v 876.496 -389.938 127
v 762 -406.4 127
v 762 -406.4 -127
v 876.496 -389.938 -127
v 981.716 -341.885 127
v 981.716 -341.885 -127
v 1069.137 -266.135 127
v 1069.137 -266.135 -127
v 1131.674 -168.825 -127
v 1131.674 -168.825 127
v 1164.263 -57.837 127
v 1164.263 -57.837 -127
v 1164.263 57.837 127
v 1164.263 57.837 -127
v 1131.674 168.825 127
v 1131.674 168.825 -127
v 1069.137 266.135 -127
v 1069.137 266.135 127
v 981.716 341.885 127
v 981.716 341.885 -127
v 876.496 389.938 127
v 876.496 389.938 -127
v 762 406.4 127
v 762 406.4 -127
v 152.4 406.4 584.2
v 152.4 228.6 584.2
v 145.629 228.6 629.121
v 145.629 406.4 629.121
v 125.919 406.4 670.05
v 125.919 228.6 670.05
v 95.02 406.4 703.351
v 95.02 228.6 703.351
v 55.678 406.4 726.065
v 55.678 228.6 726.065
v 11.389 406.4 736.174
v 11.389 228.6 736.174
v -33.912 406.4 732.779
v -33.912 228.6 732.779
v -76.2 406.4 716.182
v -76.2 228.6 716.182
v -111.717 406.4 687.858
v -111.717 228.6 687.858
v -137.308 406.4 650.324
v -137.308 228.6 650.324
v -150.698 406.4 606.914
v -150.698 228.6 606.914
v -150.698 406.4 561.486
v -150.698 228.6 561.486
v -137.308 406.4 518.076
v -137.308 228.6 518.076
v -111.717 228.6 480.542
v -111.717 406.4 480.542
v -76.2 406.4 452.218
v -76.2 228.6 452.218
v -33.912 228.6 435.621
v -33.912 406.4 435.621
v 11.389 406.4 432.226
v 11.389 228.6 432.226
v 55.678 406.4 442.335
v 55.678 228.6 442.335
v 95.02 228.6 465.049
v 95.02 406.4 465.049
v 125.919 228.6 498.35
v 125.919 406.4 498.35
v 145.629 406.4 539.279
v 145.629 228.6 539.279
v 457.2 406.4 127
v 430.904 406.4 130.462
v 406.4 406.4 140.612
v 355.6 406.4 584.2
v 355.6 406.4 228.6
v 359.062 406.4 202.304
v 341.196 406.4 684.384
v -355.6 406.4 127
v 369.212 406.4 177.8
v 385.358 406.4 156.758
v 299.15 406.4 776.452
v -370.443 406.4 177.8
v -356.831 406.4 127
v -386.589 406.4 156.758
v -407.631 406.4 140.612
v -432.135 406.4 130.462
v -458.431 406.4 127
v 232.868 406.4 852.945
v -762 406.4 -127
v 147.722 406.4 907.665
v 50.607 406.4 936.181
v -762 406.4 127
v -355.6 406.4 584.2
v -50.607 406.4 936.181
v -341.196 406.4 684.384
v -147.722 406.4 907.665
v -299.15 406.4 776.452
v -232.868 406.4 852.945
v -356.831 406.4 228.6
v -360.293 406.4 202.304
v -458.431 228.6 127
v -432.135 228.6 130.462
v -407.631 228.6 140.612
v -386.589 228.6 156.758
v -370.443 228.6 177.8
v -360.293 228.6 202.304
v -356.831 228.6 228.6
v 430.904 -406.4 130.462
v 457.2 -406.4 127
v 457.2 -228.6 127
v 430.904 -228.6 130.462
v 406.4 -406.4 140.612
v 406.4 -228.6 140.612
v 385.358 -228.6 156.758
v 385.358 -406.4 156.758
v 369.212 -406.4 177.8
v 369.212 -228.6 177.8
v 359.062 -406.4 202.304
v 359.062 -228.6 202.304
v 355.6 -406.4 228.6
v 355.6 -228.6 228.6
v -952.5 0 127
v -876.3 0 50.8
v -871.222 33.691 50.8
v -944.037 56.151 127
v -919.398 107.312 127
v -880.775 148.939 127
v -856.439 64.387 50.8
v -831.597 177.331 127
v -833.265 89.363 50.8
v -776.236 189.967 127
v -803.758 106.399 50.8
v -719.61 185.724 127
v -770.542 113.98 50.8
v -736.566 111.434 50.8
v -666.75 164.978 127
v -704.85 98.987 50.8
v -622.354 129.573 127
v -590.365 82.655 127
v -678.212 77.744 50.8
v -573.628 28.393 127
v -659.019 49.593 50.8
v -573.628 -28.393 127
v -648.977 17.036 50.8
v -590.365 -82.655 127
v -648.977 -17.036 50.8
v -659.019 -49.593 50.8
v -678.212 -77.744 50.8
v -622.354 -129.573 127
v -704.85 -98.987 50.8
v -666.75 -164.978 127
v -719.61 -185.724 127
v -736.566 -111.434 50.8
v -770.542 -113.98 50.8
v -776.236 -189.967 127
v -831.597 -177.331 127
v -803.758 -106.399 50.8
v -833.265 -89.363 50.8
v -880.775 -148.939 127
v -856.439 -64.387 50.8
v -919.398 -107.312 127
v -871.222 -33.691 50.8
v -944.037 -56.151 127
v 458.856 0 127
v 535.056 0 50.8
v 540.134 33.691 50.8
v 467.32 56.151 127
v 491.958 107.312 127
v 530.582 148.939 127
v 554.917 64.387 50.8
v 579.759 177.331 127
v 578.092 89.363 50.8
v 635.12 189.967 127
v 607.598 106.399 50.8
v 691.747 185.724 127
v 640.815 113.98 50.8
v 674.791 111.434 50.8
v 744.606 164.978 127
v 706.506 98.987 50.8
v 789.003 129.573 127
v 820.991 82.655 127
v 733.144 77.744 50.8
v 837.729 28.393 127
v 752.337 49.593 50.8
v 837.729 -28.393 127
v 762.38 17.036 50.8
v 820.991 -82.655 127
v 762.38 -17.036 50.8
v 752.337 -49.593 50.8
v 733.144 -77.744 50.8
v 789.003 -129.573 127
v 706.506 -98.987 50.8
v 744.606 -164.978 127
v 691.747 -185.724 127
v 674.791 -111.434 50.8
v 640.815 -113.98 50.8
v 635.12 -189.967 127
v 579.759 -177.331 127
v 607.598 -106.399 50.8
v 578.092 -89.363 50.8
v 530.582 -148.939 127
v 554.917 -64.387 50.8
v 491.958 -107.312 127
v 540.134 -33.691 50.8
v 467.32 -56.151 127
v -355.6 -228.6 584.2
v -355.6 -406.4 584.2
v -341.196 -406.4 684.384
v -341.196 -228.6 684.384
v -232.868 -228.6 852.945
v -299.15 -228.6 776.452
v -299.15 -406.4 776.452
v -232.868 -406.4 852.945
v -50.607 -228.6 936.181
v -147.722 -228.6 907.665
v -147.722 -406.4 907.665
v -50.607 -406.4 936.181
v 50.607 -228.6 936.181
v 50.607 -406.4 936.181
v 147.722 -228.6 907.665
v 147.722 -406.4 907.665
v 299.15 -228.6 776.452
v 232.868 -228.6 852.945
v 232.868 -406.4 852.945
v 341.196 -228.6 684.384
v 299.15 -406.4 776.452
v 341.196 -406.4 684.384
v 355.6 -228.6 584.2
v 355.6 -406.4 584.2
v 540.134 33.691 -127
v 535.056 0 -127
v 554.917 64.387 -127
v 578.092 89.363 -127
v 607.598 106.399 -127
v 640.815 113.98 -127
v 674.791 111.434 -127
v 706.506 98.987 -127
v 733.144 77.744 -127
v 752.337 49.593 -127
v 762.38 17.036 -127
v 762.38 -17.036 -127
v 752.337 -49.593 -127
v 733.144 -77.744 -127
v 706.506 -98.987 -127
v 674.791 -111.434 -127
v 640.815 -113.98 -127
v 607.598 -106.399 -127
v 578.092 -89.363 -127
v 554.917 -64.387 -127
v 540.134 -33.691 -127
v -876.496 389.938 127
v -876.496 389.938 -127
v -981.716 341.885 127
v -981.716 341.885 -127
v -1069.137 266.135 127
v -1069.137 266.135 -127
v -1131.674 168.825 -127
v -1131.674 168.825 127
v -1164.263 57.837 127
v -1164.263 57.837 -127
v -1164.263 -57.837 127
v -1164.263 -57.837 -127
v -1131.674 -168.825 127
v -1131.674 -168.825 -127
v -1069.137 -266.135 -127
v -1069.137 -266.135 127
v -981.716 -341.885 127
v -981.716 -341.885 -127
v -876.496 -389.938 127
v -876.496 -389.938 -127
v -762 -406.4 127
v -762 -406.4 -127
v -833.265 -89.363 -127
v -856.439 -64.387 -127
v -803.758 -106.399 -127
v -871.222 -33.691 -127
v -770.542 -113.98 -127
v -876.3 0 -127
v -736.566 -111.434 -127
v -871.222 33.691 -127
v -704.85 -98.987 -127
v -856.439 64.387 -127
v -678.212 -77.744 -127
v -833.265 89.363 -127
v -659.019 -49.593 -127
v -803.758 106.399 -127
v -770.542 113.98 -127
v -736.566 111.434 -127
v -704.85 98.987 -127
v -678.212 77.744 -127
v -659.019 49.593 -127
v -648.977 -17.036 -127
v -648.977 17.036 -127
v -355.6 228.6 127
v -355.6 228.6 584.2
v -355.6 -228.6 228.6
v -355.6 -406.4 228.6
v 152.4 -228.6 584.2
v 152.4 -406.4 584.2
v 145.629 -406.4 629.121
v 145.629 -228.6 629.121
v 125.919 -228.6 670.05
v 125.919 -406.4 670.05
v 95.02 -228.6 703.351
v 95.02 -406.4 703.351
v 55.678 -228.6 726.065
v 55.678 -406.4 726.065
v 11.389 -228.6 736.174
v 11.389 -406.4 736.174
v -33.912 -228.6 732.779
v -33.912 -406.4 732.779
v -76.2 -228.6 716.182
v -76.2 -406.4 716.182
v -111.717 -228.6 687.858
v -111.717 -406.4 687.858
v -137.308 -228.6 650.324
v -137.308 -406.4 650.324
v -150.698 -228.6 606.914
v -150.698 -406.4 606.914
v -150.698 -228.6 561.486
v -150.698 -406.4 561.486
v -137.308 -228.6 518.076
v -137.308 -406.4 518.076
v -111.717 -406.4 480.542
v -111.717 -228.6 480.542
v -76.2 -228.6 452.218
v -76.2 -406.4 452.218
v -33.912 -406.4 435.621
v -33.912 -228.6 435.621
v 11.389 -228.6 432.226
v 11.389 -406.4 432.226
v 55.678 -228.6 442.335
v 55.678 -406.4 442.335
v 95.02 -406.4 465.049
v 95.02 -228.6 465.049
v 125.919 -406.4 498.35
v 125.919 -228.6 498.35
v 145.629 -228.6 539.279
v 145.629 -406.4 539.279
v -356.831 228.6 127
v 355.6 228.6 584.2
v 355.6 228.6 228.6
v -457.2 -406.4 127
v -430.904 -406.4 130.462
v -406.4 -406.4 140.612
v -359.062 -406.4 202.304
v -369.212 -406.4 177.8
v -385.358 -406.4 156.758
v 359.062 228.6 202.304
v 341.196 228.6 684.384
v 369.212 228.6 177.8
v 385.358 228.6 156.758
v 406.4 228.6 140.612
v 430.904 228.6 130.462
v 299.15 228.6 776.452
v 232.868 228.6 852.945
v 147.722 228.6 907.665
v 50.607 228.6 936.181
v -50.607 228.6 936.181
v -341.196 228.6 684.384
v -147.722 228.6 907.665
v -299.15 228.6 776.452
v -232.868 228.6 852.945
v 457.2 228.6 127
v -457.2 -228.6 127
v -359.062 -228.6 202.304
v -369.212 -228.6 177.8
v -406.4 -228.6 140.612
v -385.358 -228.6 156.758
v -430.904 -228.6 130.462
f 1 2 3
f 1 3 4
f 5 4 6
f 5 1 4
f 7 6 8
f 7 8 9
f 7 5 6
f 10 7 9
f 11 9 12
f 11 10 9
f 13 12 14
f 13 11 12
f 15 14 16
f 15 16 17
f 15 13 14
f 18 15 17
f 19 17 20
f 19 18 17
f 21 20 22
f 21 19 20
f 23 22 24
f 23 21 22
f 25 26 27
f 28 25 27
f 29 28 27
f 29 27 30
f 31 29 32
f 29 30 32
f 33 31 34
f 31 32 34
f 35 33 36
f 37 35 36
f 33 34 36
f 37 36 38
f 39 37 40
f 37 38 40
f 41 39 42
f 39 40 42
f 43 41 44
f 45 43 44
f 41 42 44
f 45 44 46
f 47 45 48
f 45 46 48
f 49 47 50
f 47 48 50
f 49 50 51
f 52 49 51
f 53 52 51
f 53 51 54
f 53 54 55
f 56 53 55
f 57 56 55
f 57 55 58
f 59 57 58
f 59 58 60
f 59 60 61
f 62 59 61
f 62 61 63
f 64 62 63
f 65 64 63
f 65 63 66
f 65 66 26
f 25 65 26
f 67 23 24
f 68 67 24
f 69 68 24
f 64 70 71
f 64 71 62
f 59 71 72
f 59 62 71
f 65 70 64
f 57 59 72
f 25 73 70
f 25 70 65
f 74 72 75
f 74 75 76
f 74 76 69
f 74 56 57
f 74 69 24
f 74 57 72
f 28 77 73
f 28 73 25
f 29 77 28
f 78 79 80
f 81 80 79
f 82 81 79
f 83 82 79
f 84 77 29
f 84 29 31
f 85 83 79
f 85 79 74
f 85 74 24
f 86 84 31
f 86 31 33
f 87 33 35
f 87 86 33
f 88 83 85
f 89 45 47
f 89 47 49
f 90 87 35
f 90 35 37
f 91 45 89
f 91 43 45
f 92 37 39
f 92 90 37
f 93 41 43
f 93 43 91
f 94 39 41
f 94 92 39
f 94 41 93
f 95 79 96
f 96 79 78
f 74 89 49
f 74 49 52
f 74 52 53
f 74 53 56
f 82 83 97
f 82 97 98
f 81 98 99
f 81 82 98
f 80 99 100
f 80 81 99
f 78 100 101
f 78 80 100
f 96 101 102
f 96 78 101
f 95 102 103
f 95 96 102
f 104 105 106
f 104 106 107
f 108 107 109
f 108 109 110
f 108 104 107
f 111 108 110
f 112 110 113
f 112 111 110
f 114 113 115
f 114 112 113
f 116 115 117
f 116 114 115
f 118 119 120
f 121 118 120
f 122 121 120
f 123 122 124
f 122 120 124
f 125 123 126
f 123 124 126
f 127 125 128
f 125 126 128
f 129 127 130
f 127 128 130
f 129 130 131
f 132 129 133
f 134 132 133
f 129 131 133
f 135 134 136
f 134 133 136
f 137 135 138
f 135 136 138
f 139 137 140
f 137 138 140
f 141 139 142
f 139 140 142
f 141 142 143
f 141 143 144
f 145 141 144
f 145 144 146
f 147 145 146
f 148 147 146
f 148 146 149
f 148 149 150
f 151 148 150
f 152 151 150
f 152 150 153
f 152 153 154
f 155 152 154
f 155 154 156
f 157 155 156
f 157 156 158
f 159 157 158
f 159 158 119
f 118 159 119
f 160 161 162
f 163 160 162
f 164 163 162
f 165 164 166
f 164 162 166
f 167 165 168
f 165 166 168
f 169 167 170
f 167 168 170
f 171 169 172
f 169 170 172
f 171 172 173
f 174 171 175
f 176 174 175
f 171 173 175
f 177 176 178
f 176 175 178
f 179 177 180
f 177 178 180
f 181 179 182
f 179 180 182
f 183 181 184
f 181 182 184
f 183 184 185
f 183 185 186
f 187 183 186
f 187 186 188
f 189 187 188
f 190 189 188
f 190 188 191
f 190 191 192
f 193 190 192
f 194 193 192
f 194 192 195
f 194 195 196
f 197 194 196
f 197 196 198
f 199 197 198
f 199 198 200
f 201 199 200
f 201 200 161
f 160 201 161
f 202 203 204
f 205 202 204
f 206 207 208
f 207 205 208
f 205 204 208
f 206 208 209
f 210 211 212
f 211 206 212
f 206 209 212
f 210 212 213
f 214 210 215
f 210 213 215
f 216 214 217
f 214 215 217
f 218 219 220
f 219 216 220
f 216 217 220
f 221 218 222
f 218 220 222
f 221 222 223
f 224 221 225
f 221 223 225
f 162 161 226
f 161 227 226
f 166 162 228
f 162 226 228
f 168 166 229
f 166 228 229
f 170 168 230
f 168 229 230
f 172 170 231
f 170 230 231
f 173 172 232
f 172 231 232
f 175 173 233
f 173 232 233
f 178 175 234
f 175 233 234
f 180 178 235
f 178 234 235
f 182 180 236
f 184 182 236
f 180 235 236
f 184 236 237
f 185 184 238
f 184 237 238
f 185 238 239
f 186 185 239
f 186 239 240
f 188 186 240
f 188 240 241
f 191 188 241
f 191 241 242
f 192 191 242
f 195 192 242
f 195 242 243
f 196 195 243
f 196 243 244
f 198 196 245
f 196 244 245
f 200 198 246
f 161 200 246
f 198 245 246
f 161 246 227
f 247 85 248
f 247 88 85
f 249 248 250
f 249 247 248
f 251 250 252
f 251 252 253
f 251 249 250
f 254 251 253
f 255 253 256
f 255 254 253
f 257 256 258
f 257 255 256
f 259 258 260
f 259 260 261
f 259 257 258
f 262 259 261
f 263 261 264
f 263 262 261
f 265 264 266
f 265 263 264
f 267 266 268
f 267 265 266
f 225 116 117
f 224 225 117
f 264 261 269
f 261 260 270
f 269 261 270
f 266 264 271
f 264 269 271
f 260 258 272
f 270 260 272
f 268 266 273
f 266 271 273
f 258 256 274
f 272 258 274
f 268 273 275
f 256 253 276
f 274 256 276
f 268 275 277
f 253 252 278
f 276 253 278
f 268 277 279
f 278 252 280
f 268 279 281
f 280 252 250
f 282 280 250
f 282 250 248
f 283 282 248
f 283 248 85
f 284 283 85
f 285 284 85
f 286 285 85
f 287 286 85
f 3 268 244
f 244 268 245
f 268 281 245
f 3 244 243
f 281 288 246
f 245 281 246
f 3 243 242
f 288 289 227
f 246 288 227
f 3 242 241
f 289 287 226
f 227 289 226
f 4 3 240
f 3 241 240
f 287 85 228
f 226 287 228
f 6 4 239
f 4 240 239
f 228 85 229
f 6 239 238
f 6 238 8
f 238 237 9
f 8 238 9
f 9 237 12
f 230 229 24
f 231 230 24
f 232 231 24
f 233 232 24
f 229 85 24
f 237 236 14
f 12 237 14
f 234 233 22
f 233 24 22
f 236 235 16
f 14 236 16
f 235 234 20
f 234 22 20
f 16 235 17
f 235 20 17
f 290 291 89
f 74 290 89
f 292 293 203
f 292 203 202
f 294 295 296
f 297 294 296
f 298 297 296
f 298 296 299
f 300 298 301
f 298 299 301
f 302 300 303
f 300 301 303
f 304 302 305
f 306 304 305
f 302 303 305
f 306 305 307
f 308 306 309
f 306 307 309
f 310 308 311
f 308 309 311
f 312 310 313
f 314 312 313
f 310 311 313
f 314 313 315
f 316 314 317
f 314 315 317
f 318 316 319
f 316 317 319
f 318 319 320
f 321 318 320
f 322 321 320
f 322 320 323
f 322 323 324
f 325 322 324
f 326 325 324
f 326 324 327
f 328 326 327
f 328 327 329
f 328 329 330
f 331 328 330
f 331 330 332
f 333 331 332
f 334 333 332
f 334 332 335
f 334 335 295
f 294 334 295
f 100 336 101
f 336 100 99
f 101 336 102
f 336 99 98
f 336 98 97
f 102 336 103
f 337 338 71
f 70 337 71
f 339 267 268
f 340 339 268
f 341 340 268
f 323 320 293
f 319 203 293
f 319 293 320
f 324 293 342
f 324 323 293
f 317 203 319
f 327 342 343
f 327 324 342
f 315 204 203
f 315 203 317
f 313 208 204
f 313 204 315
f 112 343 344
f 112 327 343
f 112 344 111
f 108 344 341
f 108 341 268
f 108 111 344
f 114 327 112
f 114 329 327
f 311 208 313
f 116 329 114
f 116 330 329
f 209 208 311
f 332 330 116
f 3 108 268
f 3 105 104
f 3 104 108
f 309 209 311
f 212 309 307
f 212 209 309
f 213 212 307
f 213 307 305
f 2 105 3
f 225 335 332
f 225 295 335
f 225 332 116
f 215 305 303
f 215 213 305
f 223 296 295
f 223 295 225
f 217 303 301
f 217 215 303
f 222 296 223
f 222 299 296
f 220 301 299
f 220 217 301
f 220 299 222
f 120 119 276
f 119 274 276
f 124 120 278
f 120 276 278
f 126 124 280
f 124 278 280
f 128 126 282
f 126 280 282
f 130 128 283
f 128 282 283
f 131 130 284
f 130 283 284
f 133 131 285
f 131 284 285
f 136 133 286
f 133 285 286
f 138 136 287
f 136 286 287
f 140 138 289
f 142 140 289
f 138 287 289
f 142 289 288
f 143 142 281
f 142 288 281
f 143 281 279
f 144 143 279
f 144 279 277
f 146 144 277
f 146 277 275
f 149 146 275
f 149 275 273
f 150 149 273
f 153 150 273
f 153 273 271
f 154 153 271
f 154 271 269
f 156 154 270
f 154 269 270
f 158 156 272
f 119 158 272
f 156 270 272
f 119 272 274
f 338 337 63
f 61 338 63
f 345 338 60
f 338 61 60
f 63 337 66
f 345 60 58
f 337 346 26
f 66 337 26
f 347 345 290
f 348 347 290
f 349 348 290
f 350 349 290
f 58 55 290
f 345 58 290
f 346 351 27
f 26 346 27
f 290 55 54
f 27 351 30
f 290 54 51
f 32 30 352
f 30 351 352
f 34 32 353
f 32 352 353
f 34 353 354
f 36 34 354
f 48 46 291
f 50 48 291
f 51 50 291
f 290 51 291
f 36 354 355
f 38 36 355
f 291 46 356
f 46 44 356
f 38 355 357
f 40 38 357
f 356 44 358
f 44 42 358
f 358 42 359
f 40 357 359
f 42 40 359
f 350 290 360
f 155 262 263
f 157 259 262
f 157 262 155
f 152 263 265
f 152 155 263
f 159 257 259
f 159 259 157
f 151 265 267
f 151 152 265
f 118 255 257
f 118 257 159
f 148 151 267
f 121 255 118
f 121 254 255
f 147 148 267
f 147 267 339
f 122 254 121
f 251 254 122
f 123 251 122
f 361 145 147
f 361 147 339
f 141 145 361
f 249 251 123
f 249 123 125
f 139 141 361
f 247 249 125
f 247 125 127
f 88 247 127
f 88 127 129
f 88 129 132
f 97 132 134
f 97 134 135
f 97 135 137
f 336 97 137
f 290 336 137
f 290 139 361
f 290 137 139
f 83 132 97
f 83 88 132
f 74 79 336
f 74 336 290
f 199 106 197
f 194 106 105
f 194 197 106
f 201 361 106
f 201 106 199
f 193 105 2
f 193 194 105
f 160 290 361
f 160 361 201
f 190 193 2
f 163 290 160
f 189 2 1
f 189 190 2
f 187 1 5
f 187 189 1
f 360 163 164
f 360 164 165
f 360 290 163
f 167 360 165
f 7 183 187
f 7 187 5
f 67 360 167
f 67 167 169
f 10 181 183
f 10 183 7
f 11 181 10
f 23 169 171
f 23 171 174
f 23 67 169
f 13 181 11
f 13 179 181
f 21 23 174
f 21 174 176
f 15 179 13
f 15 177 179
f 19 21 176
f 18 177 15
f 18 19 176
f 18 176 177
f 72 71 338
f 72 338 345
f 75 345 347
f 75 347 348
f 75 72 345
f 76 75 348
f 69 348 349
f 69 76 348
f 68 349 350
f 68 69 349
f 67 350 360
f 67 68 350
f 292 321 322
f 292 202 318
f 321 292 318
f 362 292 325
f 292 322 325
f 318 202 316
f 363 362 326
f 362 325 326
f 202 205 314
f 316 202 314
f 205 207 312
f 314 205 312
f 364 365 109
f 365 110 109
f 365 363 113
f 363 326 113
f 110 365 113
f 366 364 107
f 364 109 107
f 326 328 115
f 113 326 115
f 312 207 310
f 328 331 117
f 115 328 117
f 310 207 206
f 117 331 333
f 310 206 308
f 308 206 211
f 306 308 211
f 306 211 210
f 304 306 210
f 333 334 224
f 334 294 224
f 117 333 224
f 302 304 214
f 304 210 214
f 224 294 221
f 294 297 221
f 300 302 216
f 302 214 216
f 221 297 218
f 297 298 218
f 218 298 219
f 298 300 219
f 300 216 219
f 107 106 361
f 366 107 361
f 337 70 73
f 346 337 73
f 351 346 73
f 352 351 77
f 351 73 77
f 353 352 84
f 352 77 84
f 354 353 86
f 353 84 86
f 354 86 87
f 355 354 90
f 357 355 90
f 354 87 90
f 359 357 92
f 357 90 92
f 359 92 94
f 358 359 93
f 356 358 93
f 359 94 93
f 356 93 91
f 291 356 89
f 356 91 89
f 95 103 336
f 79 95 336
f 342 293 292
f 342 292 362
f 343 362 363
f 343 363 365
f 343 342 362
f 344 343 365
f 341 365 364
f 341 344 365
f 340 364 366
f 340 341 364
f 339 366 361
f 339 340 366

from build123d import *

# Parameters (mm, degrees)
F1_DEPTH       = 127
F2_W           = 711.2
F2_H           = 177.8
F3_DEPTH       = 812.8
F4_D           = 228.6
F4_CSINK_D     = 381
F4_CSINK_ANGLE = 90
F7_DEPTH       = 177.8
F8_DEPTH       = 177.8
F9_D           = 304.8
F11_DEPTH      = 177.8
F13_DEPTH      = 177.8


with BuildPart() as f1:
    # F0 (on Top) → F1 (new body, symmetric)
    with BuildSketch(Plane.XY):
        with BuildLine():
            ThreePointArc((-762, 406.4), (-1168.4, 0), (-762, -406.4))
            Line((-762, -406.4), (762, -406.4))
            ThreePointArc((762, -406.4), (1168.4, 0), (762, 406.4))
            Line((762, 406.4), (-762, 406.4))
        make_face()
    extrude(amount=F1_DEPTH, both=True)

    # F2 (on face) → F3 (join)
    with BuildSketch(Plane.XY.offset(127)):
        with Locations((0, -317.5)):
            Rectangle(F2_W, F2_H)
        with Locations((0, 317.5)):
            Rectangle(F2_W, F2_H)
    extrude(amount=F3_DEPTH)

    # F4 (through all)
    with Locations(Plane.XY.offset(127)):
        with Locations((649.3564248085, 0), (-762, 0)):
            CounterSinkHole(F4_D / 2, F4_CSINK_D / 2, counter_sink_angle=F4_CSINK_ANGLE)

    # F5 (on face) → F7 (cut)
    with BuildSketch(Plane.XZ.offset(406.4)):
        with BuildLine():
            Line((-355.6, 939.8), (-355.6, 584.2))
            ThreePointArc((-355.6, 584.2), (-251.4471708218, 835.6471719581), (1.6069e-06, 939.8))
            Line((1.6069e-06, 939.8), (-355.6, 939.8))
        make_face()
        with BuildLine():
            ThreePointArc((1.6069e-06, 939.8), (251.4471719581, 835.6471708218), (355.6, 584.2))
            Line((355.6, 584.2), (355.6, 939.8))
            Line((355.6, 939.8), (1.6069e-06, 939.8))
        make_face()
    extrude(amount=-F7_DEPTH, mode=Mode.SUBTRACT)

    # F6 (on face) → F8 (cut)
    with BuildSketch(Plane(origin=(0, 406.4, 0), x_dir=(-1, 0, 0), z_dir=(0, 1, 0))):
        with BuildLine():
            Line((-355.6, 939.8), (-355.6, 584.2))
            ThreePointArc((-355.6, 584.2), (-251.4471708218, 835.6471719581), (1.6069e-06, 939.8))
            Line((1.6069e-06, 939.8), (-355.6, 939.8))
        make_face()
        with BuildLine():
            ThreePointArc((1.6069e-06, 939.8), (251.4471719581, 835.6471708218), (355.6, 584.2))
            Line((355.6, 584.2), (355.6, 939.8))
            Line((355.6, 939.8), (1.6069e-06, 939.8))
        make_face()
    extrude(amount=-F8_DEPTH, mode=Mode.SUBTRACT)

    # F9 (through all)
    with Locations(Plane(origin=(0, 406.4, 0), x_dir=(-1, 0, 0), z_dir=(0, 1, 0))):
        with Locations((0, 584.2)):
            Hole(F9_D / 2)

    # F10 (on face) → F11 (join)
    with BuildSketch(Plane.XZ.offset(406.4)):
        with BuildLine():
            Line((-457.2, 127), (-355.6, 127))
            Line((-355.6, 127), (-355.6, 228.6))
            ThreePointArc((-355.6, 228.6), (-385.3579510314, 156.7579510314), (-457.2, 127))
        make_face()
        with BuildLine():
            ThreePointArc((457.2, 127), (385.3579510314, 156.7579510314), (355.6, 228.6))
            Line((355.6, 228.6), (355.6, 127))
            Line((355.6, 127), (457.2, 127))
        make_face()
    extrude(amount=-F11_DEPTH)

    # F12 (on face) → F13 (join)
    with BuildSketch(Plane(origin=(0, 406.4, 0), x_dir=(-1, 0, 0), z_dir=(0, 1, 0))):
        with BuildLine():
            Line((-355.6, 127), (-355.6, 228.6))
            ThreePointArc((-355.6, 228.6), (-385.3579510314, 156.7579510314), (-457.2, 127))
            Line((-457.2, 127), (-355.6, 127))
        make_face()
        with BuildLine():
            ThreePointArc((458.4309247494, 127), (386.5888757808, 156.7579510314), (356.8309247494, 228.6))
            Line((356.8309247494, 228.6), (356.8309247494, 127))
            Line((356.8309247494, 127), (458.4309247494, 127))
        make_face()
    extrude(amount=-F13_DEPTH)


solid = f1.part
